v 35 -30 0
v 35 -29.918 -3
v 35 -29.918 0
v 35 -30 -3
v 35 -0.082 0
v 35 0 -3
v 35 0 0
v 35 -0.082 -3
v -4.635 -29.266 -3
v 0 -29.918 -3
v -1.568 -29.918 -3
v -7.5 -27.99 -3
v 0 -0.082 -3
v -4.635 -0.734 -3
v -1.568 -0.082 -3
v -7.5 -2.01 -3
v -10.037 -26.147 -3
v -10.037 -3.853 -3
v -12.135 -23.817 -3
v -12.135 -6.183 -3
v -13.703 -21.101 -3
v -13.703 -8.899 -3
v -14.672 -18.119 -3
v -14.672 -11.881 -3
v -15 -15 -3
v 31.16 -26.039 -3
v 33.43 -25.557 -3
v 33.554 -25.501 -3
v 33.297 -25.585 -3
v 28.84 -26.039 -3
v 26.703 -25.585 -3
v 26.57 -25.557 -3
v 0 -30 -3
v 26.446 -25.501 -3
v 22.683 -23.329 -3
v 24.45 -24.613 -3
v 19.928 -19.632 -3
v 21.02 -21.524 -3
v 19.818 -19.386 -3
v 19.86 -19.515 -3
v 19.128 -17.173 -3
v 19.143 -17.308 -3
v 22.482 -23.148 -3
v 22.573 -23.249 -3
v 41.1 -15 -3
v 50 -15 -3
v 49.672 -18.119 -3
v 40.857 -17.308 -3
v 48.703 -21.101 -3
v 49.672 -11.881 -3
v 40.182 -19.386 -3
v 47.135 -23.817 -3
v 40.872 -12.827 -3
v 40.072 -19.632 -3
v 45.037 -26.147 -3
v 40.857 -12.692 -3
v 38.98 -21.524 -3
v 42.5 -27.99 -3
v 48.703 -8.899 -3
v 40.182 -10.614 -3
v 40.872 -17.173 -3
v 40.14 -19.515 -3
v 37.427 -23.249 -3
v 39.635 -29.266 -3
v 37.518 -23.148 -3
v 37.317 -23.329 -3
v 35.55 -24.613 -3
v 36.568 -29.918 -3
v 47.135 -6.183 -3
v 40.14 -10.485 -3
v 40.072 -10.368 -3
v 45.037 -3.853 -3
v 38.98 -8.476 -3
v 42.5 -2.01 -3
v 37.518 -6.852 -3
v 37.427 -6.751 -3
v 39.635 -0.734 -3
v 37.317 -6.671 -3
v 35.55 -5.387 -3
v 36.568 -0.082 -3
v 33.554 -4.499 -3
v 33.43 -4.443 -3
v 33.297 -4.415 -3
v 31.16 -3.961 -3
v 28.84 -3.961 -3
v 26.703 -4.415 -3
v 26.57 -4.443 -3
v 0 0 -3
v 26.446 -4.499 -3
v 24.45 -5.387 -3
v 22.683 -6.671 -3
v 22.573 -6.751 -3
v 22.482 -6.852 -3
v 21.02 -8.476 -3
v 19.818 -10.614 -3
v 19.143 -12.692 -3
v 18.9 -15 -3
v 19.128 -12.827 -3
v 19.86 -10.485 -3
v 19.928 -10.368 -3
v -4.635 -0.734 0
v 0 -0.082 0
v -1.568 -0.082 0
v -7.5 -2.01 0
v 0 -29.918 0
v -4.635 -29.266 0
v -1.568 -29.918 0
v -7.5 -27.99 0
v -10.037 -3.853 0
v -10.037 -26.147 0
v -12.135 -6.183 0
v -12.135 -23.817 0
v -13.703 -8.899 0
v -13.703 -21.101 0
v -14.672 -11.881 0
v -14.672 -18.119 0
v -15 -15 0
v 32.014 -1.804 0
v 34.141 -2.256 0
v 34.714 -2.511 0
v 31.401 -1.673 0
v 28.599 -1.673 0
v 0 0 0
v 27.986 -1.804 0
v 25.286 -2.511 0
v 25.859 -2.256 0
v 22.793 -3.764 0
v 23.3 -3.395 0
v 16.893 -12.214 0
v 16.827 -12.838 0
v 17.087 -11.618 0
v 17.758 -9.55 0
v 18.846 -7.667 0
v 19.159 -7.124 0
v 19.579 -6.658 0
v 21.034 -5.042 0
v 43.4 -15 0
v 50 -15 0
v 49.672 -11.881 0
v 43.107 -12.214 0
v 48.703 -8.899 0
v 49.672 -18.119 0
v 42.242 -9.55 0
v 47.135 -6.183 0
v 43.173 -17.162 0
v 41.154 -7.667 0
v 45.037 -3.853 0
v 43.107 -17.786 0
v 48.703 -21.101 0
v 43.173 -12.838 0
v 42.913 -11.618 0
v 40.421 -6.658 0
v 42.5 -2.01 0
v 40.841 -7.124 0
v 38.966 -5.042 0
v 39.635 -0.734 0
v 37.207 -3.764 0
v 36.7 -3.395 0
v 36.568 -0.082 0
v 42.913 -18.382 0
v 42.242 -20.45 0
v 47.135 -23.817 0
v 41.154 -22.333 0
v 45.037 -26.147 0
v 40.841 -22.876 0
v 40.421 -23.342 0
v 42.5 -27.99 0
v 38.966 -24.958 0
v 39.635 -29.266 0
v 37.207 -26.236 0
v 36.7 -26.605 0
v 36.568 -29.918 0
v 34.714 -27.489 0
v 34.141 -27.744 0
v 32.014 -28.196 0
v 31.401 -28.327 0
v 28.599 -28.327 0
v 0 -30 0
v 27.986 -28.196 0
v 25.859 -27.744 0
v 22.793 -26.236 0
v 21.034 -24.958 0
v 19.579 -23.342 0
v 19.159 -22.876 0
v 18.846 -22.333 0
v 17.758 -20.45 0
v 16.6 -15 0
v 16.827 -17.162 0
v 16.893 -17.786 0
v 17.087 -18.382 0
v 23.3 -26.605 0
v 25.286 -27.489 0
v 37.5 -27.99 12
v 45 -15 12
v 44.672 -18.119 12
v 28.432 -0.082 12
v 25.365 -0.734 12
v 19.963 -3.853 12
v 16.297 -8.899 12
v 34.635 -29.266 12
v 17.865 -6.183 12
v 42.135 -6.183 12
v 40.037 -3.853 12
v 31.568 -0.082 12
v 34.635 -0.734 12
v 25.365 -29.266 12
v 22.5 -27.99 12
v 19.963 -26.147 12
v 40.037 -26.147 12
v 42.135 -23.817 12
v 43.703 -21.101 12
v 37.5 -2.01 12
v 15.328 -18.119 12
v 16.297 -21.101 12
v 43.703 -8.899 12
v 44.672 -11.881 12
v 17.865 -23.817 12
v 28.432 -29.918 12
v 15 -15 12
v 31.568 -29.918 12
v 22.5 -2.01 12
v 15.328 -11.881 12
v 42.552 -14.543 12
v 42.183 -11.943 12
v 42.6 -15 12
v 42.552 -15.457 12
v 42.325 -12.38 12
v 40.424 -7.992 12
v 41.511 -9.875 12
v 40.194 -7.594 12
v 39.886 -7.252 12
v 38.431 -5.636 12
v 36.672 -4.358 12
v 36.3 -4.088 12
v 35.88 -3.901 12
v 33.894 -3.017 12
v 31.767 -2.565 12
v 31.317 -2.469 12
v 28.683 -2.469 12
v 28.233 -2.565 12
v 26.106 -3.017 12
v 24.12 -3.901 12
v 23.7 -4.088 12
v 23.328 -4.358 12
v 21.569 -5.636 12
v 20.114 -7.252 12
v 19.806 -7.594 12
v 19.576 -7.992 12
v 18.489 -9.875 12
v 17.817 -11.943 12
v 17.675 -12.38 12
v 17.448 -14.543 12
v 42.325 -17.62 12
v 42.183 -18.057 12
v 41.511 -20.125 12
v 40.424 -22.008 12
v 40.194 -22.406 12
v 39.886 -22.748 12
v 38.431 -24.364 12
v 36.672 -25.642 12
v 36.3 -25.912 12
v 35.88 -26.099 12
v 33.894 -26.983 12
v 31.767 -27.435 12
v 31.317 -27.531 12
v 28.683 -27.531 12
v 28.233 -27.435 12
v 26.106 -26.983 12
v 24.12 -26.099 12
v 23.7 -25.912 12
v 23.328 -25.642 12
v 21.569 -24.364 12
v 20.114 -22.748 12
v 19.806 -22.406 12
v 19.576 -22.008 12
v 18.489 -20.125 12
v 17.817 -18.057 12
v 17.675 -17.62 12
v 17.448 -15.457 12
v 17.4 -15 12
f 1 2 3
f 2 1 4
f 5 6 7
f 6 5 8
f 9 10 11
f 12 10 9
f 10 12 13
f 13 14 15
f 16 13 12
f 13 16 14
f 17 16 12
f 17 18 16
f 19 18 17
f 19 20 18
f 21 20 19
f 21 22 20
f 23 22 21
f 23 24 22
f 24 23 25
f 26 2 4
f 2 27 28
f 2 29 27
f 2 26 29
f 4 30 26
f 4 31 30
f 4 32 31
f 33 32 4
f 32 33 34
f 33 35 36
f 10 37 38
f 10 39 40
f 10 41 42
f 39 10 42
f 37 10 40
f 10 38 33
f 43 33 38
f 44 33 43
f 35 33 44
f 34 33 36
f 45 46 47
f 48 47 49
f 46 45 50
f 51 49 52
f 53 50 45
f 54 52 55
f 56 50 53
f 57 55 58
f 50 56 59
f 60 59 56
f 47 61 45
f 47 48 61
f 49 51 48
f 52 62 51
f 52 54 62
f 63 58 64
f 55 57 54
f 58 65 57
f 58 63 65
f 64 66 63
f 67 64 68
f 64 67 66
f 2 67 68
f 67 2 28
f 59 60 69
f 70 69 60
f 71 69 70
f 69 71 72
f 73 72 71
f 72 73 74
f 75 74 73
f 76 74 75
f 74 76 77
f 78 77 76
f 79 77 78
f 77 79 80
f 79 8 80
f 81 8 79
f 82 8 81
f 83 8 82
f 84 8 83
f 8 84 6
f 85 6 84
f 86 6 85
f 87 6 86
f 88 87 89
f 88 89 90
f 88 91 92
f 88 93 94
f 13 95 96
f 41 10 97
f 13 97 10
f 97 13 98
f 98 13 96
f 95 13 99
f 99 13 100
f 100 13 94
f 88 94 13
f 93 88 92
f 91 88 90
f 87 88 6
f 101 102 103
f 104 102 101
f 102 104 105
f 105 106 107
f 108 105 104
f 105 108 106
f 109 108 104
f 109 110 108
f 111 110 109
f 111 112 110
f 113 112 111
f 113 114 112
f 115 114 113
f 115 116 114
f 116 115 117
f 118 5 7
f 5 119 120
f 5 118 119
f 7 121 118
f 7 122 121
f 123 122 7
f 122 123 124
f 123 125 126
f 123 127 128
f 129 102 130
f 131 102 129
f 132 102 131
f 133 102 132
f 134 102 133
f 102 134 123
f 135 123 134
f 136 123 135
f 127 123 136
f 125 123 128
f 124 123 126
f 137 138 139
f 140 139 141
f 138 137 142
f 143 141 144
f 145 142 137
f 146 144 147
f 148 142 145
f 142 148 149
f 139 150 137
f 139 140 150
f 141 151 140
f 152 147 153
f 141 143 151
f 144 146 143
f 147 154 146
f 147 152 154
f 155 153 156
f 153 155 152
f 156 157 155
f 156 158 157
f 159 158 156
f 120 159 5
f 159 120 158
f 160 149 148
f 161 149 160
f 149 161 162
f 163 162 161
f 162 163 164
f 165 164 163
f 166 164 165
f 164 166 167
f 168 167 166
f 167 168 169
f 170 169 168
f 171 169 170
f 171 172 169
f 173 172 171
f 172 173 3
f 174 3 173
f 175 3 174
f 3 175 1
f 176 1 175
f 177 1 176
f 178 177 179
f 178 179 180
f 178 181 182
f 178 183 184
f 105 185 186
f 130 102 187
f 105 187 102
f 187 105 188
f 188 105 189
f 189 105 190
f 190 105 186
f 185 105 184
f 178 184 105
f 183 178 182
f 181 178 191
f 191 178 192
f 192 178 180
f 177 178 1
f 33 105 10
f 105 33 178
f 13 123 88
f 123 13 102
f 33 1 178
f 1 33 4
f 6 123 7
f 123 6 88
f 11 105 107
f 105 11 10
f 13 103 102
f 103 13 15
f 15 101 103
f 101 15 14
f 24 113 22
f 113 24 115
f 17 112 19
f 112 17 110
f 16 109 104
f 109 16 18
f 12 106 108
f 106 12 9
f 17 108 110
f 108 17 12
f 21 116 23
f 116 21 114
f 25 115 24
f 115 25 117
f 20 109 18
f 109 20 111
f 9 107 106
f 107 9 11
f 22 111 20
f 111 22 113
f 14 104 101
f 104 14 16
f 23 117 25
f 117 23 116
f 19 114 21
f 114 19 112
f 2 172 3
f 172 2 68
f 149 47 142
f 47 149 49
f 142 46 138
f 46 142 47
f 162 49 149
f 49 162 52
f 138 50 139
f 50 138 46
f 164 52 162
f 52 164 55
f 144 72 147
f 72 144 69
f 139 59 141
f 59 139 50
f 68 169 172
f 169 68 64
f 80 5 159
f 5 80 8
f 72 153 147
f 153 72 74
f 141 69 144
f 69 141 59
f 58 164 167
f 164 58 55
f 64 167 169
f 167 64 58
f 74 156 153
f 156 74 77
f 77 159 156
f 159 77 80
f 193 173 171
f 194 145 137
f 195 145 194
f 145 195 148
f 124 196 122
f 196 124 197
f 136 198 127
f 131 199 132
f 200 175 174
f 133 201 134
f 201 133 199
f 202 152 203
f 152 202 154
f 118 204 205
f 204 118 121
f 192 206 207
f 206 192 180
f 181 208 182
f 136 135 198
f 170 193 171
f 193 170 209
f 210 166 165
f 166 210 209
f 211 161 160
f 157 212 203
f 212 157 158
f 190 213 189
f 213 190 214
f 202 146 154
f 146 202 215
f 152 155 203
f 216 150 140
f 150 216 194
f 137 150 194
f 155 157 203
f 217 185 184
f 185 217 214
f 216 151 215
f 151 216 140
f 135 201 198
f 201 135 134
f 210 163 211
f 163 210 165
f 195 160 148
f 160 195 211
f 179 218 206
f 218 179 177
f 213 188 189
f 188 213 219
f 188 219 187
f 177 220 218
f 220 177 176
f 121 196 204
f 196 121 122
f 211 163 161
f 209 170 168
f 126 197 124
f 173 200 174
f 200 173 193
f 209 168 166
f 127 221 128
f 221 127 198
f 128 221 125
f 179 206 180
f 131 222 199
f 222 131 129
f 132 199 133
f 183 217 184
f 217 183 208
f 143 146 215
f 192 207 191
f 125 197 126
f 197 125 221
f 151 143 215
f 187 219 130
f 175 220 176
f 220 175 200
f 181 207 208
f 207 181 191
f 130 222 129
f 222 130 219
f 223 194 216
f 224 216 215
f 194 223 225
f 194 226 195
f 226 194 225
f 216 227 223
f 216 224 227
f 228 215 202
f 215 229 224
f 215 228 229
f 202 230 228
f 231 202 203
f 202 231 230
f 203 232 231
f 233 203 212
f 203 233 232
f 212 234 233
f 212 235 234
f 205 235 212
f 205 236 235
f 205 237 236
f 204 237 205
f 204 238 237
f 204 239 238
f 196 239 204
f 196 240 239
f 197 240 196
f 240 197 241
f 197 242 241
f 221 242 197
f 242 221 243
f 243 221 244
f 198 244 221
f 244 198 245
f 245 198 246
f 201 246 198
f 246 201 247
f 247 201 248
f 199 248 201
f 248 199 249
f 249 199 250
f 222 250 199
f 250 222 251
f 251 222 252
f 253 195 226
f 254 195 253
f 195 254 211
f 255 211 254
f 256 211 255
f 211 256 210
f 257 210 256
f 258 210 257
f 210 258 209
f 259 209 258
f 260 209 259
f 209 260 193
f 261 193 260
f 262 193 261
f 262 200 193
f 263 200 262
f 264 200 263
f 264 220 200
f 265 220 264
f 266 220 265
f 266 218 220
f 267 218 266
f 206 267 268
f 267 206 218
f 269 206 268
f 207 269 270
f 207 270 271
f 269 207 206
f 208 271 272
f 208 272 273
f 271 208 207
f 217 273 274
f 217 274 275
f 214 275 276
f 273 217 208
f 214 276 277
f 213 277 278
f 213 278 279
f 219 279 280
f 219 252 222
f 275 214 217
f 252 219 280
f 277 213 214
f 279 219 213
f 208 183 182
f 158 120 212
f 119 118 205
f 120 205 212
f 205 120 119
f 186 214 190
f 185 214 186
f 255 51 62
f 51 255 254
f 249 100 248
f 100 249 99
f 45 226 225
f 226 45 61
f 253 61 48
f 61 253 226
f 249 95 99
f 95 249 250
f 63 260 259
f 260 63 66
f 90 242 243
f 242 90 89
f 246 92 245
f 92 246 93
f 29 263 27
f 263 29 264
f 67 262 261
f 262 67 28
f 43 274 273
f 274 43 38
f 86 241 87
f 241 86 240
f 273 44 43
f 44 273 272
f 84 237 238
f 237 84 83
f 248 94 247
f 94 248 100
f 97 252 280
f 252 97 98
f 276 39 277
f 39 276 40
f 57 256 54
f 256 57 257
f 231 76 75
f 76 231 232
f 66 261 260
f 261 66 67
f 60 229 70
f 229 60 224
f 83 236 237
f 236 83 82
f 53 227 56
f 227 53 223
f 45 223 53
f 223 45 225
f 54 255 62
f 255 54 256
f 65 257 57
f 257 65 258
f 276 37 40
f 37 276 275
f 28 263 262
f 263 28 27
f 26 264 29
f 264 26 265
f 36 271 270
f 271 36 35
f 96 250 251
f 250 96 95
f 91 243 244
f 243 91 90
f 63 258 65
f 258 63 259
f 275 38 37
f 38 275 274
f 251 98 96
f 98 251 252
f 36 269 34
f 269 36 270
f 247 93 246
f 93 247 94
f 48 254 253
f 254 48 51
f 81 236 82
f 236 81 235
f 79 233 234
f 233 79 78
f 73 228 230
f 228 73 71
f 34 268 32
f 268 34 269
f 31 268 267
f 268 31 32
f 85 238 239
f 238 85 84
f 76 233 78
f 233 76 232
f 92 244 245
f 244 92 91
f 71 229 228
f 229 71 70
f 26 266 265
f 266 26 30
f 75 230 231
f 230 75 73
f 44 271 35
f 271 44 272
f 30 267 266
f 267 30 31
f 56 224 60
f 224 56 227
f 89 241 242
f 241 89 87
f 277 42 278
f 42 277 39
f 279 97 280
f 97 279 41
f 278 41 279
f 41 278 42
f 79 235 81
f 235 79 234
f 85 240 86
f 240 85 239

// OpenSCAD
stoplength=35; // change the length of stopper

rotate ([180, 0,0]) union(){
difference (){
    union (){
        cube ([stoplength, 30, 3]);
        translate ([0,15,0]) cylinder (3, 15, 15);
        translate ([stoplength,15,0]) cylinder (3, 15, 15);
        translate ([(stoplength-5),15,-12])  cylinder (15, 15, 13);
    }
translate ([(stoplength-5),15,-16]) rotate ([0, 0, 0]) cylinder (20, 13, 11);
}
}


//For - www.homedepot.com/p/Everbilt-Stainless-Steel-Decorative-Sliding-Door-Hardware-14455/205706155
